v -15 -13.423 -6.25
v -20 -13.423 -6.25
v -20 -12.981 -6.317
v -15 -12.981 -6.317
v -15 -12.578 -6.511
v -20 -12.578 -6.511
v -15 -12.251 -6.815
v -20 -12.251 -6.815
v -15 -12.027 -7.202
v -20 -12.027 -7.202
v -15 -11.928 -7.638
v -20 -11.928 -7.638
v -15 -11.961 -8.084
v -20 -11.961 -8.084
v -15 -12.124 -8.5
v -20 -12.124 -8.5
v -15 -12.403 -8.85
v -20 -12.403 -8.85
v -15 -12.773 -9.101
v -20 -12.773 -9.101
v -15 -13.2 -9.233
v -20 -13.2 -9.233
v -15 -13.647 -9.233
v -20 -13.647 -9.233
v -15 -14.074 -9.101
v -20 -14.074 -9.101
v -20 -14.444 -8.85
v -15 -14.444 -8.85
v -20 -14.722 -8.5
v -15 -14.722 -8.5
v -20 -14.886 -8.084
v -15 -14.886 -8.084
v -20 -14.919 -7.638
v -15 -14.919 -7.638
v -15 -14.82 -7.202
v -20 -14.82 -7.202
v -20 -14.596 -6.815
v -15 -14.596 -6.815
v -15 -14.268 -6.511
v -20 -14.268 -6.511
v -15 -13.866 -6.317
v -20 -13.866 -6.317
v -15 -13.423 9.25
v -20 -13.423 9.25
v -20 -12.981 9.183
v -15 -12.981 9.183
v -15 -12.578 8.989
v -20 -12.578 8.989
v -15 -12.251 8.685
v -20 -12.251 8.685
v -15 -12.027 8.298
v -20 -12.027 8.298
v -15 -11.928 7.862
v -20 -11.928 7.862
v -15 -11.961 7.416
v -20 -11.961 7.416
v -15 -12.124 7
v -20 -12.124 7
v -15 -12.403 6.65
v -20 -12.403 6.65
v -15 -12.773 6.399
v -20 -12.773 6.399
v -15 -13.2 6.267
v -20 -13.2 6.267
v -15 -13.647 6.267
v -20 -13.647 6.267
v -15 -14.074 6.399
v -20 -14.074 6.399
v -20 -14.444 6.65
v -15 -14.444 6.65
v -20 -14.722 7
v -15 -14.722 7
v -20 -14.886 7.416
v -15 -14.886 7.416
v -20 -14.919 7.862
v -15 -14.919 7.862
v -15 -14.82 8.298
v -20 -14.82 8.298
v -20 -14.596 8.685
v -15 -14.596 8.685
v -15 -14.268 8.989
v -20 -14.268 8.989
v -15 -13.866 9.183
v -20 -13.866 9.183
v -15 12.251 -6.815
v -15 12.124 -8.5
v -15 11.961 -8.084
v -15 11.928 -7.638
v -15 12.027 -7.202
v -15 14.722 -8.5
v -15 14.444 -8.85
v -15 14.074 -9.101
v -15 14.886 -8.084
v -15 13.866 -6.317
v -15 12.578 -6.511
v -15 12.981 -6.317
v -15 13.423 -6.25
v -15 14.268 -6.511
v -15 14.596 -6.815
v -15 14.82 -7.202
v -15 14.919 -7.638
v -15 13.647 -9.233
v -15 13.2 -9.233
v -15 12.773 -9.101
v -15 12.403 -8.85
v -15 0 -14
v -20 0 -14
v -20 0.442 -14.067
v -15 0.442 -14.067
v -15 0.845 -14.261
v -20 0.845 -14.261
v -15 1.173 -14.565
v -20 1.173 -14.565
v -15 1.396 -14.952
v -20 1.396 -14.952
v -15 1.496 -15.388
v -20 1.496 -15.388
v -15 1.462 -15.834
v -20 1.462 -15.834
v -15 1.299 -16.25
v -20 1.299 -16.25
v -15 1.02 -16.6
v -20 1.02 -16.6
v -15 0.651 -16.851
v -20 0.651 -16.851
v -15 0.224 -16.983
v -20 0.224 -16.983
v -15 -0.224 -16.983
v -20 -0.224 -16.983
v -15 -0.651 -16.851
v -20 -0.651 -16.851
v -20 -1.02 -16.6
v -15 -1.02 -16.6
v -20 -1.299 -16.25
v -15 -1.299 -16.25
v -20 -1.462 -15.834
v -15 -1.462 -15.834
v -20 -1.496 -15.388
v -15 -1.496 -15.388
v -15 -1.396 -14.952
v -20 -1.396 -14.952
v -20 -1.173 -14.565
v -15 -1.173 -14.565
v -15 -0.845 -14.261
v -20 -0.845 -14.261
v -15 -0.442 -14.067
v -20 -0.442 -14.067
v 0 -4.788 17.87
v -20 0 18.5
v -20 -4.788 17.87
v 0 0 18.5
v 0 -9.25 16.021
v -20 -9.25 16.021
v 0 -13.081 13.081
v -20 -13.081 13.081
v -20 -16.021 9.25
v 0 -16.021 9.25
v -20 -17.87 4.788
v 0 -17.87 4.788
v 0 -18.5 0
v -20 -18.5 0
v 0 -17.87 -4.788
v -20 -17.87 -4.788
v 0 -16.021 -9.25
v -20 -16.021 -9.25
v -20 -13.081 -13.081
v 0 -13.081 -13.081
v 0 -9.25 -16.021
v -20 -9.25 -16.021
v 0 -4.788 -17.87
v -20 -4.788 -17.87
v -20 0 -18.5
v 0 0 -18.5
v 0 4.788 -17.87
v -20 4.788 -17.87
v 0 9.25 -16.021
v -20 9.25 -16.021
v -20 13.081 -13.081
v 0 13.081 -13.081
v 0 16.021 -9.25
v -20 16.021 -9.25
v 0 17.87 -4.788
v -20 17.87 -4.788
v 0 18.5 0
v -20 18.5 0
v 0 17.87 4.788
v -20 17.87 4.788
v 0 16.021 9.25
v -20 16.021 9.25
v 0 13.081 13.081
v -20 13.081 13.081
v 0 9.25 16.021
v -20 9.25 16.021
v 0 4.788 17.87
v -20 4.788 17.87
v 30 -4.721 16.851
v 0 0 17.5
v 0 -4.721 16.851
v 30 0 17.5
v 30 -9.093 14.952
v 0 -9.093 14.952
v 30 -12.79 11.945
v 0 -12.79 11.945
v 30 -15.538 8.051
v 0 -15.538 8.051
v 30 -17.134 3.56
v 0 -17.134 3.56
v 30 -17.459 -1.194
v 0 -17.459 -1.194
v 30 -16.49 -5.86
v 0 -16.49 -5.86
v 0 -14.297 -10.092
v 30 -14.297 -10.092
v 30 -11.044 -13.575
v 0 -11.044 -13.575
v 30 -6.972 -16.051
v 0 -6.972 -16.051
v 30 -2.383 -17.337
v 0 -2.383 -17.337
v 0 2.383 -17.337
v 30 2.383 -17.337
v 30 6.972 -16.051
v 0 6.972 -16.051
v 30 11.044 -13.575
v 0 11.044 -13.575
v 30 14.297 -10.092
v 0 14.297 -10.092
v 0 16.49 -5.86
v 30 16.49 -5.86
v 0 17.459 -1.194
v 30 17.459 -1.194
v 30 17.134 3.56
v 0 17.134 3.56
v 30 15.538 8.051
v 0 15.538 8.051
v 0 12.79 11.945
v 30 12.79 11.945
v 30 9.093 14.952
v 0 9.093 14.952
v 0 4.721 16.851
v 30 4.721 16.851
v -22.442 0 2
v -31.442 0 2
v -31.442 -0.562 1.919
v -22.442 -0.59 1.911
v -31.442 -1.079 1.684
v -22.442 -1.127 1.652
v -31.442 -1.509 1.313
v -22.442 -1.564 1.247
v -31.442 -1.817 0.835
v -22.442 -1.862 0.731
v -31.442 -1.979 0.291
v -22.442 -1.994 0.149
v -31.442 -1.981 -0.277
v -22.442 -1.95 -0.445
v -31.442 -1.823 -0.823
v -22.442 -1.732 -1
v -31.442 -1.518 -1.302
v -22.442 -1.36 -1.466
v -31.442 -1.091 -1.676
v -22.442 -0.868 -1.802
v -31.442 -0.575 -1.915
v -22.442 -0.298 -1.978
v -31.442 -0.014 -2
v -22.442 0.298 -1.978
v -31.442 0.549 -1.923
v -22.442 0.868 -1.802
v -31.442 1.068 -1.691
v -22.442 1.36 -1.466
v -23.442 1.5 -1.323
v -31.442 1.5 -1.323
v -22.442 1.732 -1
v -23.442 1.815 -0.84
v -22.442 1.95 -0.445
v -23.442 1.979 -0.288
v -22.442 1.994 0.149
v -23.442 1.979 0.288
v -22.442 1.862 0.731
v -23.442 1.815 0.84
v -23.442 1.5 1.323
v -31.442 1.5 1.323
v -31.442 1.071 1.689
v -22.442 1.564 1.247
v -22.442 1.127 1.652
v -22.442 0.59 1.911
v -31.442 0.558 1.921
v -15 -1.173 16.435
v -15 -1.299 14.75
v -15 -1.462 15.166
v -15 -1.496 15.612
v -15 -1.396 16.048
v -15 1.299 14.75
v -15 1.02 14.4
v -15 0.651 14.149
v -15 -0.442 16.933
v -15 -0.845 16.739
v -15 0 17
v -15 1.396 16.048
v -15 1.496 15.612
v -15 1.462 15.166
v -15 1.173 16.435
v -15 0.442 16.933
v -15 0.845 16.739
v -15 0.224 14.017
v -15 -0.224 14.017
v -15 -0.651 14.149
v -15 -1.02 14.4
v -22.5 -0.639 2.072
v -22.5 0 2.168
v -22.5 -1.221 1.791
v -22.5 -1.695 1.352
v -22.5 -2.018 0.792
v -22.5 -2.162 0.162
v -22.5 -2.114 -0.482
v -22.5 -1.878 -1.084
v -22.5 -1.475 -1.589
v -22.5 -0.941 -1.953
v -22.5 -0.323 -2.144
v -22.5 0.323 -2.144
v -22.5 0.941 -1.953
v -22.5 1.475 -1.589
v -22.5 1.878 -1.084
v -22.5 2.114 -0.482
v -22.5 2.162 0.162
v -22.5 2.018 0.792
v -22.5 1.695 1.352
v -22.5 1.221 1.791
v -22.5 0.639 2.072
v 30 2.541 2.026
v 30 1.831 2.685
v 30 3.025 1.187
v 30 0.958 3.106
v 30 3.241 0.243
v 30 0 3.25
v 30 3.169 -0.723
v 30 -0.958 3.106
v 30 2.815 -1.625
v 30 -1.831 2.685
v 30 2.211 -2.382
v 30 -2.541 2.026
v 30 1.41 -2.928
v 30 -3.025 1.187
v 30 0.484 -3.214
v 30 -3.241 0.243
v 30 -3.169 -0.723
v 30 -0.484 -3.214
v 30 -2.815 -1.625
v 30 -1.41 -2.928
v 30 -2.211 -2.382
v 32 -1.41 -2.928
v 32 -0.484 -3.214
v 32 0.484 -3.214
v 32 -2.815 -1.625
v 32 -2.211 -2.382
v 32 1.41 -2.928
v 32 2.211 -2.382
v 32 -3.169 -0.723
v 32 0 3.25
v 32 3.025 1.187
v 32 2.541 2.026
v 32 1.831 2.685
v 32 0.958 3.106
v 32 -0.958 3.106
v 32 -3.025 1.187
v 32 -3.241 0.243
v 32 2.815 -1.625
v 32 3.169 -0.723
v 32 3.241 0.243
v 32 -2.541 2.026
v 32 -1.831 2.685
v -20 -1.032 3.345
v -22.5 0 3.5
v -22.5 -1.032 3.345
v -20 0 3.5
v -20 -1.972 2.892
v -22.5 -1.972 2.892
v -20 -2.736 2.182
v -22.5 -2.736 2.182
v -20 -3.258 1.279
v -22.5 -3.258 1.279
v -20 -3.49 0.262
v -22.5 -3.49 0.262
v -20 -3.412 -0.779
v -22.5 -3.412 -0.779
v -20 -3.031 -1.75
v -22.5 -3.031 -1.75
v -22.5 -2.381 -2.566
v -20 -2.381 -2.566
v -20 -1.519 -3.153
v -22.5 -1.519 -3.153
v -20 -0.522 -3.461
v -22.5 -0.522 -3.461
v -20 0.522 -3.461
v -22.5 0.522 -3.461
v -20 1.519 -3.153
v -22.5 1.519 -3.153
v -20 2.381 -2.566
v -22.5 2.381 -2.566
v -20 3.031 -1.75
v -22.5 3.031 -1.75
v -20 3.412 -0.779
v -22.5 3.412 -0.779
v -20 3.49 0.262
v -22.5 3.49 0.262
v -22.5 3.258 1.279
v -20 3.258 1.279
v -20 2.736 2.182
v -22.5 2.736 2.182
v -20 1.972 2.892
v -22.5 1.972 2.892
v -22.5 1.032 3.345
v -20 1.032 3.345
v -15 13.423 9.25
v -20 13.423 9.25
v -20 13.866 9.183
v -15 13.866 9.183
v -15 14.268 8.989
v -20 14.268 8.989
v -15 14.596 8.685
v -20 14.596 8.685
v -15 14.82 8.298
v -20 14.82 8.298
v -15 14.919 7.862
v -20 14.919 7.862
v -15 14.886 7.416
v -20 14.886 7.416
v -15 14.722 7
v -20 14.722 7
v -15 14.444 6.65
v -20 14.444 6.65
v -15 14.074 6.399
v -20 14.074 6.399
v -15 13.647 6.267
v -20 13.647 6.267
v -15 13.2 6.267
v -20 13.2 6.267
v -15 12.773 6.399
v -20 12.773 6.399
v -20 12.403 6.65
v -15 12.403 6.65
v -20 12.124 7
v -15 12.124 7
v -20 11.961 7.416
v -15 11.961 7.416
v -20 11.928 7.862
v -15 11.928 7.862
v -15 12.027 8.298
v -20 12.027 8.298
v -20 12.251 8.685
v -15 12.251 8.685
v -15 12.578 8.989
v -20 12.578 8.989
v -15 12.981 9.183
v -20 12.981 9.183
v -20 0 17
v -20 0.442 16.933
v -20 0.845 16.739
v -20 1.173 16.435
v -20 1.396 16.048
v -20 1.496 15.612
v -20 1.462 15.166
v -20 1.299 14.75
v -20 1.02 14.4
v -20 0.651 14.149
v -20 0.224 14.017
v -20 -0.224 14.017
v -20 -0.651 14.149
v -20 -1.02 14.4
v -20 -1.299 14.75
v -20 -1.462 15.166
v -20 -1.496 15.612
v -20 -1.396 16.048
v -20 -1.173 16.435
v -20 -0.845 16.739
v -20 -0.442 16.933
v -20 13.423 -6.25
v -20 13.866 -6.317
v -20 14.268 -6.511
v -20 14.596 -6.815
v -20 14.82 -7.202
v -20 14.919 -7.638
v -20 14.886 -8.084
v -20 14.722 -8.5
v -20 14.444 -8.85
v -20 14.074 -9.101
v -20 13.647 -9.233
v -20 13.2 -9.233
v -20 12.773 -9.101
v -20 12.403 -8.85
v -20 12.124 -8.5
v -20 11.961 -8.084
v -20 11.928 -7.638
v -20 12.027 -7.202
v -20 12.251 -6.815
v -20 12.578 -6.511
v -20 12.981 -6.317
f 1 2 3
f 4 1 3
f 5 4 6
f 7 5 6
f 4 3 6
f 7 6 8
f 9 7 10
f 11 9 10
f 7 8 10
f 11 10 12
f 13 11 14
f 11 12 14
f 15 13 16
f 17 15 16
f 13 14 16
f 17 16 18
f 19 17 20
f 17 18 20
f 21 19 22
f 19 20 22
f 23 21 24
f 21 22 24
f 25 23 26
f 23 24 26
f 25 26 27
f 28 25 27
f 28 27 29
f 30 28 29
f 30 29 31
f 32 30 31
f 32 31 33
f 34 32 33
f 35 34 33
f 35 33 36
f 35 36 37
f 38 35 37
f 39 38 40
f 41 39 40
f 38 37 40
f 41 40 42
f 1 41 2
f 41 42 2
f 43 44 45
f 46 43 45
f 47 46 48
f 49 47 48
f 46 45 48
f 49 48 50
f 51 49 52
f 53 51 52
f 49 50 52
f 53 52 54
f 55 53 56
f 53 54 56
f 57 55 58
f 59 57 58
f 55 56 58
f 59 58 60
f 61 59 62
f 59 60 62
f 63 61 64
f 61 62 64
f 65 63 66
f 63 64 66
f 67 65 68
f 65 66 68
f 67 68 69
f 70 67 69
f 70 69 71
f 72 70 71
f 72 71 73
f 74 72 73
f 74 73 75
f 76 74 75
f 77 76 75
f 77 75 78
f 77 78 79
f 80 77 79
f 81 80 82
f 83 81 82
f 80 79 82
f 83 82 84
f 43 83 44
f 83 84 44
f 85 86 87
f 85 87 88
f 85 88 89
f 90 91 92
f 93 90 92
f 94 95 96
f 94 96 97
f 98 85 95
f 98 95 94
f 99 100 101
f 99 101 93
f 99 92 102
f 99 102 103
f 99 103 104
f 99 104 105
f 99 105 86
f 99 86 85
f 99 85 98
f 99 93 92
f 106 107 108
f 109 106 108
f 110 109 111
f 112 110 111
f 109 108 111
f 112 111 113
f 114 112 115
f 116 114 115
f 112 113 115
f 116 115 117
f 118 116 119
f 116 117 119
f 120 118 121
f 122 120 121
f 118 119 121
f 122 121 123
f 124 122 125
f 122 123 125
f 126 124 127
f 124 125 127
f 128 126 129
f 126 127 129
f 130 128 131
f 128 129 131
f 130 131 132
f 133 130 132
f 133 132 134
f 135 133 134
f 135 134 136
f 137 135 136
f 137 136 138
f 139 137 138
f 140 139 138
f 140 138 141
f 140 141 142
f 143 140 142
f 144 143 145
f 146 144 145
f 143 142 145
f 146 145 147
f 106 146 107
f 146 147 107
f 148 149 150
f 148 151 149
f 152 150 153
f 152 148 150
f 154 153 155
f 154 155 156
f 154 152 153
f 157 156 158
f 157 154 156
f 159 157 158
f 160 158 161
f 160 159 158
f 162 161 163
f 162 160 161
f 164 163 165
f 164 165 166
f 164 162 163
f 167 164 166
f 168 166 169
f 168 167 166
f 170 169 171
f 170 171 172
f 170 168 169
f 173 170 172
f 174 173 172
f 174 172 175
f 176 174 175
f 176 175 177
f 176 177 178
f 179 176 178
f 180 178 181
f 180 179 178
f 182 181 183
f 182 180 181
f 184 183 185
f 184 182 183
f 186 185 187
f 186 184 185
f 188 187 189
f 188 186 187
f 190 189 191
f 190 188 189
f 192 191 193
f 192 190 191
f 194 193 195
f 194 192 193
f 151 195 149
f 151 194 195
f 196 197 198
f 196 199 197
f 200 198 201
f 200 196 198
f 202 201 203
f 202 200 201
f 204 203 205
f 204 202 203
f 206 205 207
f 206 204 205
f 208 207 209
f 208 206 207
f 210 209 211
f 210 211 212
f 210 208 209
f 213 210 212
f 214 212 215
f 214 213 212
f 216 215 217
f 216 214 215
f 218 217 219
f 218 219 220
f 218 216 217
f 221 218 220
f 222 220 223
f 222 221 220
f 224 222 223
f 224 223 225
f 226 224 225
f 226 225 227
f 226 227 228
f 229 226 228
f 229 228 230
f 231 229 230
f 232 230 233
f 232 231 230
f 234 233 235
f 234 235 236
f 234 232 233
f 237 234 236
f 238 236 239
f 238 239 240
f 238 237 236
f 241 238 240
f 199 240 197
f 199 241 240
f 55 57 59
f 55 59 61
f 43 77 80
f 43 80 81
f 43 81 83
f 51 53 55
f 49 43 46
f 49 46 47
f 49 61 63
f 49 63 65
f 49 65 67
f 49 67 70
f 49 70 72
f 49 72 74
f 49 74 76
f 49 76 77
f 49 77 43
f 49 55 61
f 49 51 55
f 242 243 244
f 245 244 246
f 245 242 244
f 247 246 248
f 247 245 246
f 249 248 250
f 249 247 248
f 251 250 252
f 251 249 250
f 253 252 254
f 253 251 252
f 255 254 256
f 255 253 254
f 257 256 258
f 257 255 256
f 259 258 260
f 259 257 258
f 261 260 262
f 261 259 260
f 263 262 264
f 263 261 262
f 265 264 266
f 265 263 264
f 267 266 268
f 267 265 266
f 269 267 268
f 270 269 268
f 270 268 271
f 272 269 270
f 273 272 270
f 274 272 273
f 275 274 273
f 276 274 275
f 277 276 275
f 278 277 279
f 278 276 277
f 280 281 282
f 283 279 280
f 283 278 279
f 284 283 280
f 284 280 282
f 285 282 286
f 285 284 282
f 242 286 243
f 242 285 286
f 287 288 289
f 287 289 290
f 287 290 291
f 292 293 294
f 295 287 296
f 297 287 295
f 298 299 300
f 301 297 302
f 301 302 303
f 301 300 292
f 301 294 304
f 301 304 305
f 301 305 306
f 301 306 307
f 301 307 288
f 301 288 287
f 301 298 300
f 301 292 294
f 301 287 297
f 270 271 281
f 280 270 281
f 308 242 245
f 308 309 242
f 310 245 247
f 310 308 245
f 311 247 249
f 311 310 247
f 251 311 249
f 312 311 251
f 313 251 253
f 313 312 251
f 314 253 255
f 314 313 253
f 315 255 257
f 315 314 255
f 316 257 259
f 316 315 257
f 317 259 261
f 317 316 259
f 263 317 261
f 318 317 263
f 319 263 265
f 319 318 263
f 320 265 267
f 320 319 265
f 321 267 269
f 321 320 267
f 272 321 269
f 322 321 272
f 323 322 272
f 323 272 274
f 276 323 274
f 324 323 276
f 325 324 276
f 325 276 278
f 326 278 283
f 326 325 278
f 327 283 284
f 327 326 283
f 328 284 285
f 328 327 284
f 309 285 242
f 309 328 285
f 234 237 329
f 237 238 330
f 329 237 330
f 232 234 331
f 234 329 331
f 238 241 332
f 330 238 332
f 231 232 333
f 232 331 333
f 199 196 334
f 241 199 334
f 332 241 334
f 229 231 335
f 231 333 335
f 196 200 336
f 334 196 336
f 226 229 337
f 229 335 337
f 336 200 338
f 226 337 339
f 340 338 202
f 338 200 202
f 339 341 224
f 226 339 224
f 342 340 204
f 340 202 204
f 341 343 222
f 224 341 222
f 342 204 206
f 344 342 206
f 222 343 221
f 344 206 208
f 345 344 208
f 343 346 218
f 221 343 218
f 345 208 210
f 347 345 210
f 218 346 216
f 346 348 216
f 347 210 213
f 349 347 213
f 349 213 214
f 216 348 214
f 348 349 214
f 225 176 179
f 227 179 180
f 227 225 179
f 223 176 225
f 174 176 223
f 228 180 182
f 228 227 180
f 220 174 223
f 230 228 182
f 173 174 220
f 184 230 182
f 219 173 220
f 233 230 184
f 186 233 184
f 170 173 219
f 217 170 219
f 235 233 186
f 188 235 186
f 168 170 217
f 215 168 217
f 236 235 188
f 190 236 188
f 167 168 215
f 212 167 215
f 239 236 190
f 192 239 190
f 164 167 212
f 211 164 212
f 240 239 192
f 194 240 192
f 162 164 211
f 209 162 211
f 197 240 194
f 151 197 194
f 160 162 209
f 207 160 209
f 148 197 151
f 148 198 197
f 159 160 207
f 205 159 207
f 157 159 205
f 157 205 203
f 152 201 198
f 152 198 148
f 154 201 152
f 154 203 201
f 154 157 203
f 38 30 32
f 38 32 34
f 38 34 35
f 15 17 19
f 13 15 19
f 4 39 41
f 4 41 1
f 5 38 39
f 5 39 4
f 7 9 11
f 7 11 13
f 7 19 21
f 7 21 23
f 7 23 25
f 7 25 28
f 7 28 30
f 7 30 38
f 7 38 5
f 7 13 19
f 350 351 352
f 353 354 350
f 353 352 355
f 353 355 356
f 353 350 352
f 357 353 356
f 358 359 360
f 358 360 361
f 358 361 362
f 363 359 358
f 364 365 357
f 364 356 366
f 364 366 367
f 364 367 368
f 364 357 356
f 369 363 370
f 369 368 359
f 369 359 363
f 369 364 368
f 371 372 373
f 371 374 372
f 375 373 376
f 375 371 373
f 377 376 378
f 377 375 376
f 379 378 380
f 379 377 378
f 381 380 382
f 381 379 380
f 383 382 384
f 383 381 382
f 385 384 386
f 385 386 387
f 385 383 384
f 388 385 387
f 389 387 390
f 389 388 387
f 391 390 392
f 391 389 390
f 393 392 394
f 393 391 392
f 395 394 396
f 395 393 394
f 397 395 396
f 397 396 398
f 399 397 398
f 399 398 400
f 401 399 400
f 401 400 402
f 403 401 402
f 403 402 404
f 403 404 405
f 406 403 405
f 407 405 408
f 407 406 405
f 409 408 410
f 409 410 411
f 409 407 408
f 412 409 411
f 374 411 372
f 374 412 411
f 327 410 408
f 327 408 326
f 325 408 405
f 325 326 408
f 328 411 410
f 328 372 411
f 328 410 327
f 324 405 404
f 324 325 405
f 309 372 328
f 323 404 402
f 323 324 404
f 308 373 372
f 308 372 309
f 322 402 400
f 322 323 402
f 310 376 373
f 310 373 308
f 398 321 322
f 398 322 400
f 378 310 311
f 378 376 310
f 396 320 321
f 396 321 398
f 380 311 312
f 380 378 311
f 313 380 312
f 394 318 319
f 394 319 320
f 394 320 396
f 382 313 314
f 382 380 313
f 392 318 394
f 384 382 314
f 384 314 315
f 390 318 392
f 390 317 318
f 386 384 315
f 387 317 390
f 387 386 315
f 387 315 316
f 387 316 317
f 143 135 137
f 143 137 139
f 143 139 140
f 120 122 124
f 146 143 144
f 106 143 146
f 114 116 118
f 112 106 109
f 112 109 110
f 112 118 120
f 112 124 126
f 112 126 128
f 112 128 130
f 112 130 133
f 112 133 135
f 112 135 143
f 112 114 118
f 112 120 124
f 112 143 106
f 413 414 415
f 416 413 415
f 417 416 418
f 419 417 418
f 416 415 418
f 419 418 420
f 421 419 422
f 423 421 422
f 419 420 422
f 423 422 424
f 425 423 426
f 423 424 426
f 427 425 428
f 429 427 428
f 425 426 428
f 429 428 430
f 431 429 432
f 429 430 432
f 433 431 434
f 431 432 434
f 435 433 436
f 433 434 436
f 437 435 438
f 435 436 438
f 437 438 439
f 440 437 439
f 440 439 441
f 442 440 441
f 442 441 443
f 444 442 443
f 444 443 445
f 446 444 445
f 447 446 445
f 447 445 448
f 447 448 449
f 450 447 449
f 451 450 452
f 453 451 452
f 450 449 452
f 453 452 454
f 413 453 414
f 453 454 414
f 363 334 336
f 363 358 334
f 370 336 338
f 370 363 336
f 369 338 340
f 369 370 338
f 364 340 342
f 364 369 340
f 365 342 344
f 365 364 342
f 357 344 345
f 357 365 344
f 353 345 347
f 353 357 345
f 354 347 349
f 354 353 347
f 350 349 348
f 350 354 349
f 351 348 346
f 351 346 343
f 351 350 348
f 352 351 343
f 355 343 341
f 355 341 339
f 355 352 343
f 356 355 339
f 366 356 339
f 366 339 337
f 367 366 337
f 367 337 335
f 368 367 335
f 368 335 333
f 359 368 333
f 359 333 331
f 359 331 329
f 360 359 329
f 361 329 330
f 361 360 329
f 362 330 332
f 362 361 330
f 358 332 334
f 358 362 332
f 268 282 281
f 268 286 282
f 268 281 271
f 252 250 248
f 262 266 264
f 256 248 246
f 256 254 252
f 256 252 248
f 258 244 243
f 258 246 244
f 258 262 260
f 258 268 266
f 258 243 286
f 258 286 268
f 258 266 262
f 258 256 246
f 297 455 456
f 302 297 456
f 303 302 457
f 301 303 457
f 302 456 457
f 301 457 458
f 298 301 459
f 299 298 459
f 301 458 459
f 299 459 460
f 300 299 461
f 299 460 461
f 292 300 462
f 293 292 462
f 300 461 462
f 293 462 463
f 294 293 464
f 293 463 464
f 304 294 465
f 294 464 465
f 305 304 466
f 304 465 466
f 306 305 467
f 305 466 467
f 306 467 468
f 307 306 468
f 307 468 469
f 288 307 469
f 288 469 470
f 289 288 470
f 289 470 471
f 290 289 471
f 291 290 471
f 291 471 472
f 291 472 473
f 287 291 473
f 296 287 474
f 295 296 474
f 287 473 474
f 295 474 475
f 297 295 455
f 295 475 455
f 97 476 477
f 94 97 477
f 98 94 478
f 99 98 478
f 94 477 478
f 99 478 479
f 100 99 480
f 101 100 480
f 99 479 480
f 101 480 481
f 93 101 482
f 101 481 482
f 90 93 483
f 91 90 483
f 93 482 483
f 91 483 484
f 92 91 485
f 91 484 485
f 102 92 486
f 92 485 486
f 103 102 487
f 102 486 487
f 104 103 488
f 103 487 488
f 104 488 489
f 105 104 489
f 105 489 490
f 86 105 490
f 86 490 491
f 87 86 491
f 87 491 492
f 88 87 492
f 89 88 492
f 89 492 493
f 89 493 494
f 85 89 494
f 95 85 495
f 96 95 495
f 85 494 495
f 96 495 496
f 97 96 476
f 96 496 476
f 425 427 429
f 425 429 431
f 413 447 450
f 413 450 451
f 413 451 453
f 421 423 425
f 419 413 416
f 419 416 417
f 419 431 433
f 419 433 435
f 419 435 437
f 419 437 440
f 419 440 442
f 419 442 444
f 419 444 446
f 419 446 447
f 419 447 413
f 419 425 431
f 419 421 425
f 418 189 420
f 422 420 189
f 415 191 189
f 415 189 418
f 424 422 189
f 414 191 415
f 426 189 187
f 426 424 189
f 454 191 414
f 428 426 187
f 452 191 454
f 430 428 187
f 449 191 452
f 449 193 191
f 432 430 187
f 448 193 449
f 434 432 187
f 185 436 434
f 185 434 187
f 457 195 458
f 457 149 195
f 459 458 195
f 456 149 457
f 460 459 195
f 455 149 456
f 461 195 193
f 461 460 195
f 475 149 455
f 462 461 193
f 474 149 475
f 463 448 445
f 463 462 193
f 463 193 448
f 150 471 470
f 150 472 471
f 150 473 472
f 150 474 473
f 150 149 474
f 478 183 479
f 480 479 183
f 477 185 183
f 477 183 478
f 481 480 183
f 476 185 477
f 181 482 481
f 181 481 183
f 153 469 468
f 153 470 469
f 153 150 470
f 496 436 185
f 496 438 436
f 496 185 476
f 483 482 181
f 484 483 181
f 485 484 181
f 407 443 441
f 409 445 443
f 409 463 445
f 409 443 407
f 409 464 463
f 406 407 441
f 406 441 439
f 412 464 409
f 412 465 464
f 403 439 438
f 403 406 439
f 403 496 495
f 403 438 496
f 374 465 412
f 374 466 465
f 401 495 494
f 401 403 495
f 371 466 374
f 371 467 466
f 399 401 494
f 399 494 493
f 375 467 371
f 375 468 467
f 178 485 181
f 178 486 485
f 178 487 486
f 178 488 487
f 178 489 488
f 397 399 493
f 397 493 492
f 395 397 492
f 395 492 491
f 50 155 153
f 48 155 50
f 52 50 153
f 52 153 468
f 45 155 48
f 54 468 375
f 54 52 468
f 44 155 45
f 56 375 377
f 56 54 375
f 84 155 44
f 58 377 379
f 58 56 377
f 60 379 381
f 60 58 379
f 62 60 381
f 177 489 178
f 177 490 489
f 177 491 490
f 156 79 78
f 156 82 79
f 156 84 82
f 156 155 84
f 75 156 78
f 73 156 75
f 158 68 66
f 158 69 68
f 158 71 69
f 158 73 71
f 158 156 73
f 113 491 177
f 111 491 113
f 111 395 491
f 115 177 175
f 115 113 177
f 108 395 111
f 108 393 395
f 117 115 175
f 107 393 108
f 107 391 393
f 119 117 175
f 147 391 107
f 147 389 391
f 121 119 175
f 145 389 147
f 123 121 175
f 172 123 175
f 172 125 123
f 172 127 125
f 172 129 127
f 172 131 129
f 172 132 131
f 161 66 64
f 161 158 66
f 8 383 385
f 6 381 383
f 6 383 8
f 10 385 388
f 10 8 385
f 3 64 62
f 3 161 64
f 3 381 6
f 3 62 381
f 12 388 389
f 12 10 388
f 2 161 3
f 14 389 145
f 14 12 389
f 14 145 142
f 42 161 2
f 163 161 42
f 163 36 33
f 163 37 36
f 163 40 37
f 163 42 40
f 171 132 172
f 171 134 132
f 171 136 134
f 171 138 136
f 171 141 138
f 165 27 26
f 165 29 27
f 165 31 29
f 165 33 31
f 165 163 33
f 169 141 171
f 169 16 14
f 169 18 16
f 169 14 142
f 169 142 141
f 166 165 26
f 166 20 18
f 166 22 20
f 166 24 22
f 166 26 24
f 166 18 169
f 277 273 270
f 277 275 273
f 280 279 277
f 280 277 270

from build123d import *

# Parameters (mm, degrees)
SKETCH_2_R          = 1.5
CUT_EXTRUDE_1_DEPTH = 5
SKETCH_3_W          = 5.127083255
SKETCH_3_H          = 1.657522806
CUT_EXTRUDE_2_DEPTH = 8


with BuildPart() as part:
    # 草图1 → 旋转1 (revolve)
    with BuildSketch(Plane.XY, mode=Mode.PRIVATE) as revolve_1_sk:
        Polygon((30, 17.5), (30, 12.2), (30, 3.25), (32, 3.25), (32, 0), (30.858335085, 0), (0, 0), (-19.941664915, 0), (-22.441664915, 0), (-31.441664915, 0), (-31.441664915, 2), (-22.441664915, 2), (-22.5, 2.168145965), (-22.5, 3.5), (-20, 3.5), (-20, 18.5), (0, 18.5), (0, 17.5), align=None)
    revolve(revolve_1_sk.sketch.rotate(Axis((-72.034969576, 0, 0), (1, 0, 0)), 90), axis=Axis((-72.034969576, 0, 0), (1, 0, 0)))

    # 草图2 → 切除-拉伸1 (cut)
    with BuildSketch(Plane.ZY.offset(20)):
        with Locations((15.5, 0)):
            Circle(SKETCH_2_R)
        with Locations((7.75, -13.423393759)):
            Circle(SKETCH_2_R)
        with Locations((-7.75, -13.423393759)):
            Circle(SKETCH_2_R)
        with Locations((-15.5, 0)):
            Circle(SKETCH_2_R)
        with Locations((-7.75, 13.423393759)):
            Circle(SKETCH_2_R)
        with Locations((7.75, 13.423393759)):
            Circle(SKETCH_2_R)
    extrude(amount=-CUT_EXTRUDE_1_DEPTH, mode=Mode.SUBTRACT)

    # 草图3 → 切除-拉伸2 (cut)
    with BuildSketch(Plane.ZY.offset(31.441664915)):
        with Locations((0.013848215, 2.328761403)):
            Rectangle(SKETCH_3_W, SKETCH_3_H)
    extrude(amount=-CUT_EXTRUDE_2_DEPTH, mode=Mode.SUBTRACT)


solid = part.part
